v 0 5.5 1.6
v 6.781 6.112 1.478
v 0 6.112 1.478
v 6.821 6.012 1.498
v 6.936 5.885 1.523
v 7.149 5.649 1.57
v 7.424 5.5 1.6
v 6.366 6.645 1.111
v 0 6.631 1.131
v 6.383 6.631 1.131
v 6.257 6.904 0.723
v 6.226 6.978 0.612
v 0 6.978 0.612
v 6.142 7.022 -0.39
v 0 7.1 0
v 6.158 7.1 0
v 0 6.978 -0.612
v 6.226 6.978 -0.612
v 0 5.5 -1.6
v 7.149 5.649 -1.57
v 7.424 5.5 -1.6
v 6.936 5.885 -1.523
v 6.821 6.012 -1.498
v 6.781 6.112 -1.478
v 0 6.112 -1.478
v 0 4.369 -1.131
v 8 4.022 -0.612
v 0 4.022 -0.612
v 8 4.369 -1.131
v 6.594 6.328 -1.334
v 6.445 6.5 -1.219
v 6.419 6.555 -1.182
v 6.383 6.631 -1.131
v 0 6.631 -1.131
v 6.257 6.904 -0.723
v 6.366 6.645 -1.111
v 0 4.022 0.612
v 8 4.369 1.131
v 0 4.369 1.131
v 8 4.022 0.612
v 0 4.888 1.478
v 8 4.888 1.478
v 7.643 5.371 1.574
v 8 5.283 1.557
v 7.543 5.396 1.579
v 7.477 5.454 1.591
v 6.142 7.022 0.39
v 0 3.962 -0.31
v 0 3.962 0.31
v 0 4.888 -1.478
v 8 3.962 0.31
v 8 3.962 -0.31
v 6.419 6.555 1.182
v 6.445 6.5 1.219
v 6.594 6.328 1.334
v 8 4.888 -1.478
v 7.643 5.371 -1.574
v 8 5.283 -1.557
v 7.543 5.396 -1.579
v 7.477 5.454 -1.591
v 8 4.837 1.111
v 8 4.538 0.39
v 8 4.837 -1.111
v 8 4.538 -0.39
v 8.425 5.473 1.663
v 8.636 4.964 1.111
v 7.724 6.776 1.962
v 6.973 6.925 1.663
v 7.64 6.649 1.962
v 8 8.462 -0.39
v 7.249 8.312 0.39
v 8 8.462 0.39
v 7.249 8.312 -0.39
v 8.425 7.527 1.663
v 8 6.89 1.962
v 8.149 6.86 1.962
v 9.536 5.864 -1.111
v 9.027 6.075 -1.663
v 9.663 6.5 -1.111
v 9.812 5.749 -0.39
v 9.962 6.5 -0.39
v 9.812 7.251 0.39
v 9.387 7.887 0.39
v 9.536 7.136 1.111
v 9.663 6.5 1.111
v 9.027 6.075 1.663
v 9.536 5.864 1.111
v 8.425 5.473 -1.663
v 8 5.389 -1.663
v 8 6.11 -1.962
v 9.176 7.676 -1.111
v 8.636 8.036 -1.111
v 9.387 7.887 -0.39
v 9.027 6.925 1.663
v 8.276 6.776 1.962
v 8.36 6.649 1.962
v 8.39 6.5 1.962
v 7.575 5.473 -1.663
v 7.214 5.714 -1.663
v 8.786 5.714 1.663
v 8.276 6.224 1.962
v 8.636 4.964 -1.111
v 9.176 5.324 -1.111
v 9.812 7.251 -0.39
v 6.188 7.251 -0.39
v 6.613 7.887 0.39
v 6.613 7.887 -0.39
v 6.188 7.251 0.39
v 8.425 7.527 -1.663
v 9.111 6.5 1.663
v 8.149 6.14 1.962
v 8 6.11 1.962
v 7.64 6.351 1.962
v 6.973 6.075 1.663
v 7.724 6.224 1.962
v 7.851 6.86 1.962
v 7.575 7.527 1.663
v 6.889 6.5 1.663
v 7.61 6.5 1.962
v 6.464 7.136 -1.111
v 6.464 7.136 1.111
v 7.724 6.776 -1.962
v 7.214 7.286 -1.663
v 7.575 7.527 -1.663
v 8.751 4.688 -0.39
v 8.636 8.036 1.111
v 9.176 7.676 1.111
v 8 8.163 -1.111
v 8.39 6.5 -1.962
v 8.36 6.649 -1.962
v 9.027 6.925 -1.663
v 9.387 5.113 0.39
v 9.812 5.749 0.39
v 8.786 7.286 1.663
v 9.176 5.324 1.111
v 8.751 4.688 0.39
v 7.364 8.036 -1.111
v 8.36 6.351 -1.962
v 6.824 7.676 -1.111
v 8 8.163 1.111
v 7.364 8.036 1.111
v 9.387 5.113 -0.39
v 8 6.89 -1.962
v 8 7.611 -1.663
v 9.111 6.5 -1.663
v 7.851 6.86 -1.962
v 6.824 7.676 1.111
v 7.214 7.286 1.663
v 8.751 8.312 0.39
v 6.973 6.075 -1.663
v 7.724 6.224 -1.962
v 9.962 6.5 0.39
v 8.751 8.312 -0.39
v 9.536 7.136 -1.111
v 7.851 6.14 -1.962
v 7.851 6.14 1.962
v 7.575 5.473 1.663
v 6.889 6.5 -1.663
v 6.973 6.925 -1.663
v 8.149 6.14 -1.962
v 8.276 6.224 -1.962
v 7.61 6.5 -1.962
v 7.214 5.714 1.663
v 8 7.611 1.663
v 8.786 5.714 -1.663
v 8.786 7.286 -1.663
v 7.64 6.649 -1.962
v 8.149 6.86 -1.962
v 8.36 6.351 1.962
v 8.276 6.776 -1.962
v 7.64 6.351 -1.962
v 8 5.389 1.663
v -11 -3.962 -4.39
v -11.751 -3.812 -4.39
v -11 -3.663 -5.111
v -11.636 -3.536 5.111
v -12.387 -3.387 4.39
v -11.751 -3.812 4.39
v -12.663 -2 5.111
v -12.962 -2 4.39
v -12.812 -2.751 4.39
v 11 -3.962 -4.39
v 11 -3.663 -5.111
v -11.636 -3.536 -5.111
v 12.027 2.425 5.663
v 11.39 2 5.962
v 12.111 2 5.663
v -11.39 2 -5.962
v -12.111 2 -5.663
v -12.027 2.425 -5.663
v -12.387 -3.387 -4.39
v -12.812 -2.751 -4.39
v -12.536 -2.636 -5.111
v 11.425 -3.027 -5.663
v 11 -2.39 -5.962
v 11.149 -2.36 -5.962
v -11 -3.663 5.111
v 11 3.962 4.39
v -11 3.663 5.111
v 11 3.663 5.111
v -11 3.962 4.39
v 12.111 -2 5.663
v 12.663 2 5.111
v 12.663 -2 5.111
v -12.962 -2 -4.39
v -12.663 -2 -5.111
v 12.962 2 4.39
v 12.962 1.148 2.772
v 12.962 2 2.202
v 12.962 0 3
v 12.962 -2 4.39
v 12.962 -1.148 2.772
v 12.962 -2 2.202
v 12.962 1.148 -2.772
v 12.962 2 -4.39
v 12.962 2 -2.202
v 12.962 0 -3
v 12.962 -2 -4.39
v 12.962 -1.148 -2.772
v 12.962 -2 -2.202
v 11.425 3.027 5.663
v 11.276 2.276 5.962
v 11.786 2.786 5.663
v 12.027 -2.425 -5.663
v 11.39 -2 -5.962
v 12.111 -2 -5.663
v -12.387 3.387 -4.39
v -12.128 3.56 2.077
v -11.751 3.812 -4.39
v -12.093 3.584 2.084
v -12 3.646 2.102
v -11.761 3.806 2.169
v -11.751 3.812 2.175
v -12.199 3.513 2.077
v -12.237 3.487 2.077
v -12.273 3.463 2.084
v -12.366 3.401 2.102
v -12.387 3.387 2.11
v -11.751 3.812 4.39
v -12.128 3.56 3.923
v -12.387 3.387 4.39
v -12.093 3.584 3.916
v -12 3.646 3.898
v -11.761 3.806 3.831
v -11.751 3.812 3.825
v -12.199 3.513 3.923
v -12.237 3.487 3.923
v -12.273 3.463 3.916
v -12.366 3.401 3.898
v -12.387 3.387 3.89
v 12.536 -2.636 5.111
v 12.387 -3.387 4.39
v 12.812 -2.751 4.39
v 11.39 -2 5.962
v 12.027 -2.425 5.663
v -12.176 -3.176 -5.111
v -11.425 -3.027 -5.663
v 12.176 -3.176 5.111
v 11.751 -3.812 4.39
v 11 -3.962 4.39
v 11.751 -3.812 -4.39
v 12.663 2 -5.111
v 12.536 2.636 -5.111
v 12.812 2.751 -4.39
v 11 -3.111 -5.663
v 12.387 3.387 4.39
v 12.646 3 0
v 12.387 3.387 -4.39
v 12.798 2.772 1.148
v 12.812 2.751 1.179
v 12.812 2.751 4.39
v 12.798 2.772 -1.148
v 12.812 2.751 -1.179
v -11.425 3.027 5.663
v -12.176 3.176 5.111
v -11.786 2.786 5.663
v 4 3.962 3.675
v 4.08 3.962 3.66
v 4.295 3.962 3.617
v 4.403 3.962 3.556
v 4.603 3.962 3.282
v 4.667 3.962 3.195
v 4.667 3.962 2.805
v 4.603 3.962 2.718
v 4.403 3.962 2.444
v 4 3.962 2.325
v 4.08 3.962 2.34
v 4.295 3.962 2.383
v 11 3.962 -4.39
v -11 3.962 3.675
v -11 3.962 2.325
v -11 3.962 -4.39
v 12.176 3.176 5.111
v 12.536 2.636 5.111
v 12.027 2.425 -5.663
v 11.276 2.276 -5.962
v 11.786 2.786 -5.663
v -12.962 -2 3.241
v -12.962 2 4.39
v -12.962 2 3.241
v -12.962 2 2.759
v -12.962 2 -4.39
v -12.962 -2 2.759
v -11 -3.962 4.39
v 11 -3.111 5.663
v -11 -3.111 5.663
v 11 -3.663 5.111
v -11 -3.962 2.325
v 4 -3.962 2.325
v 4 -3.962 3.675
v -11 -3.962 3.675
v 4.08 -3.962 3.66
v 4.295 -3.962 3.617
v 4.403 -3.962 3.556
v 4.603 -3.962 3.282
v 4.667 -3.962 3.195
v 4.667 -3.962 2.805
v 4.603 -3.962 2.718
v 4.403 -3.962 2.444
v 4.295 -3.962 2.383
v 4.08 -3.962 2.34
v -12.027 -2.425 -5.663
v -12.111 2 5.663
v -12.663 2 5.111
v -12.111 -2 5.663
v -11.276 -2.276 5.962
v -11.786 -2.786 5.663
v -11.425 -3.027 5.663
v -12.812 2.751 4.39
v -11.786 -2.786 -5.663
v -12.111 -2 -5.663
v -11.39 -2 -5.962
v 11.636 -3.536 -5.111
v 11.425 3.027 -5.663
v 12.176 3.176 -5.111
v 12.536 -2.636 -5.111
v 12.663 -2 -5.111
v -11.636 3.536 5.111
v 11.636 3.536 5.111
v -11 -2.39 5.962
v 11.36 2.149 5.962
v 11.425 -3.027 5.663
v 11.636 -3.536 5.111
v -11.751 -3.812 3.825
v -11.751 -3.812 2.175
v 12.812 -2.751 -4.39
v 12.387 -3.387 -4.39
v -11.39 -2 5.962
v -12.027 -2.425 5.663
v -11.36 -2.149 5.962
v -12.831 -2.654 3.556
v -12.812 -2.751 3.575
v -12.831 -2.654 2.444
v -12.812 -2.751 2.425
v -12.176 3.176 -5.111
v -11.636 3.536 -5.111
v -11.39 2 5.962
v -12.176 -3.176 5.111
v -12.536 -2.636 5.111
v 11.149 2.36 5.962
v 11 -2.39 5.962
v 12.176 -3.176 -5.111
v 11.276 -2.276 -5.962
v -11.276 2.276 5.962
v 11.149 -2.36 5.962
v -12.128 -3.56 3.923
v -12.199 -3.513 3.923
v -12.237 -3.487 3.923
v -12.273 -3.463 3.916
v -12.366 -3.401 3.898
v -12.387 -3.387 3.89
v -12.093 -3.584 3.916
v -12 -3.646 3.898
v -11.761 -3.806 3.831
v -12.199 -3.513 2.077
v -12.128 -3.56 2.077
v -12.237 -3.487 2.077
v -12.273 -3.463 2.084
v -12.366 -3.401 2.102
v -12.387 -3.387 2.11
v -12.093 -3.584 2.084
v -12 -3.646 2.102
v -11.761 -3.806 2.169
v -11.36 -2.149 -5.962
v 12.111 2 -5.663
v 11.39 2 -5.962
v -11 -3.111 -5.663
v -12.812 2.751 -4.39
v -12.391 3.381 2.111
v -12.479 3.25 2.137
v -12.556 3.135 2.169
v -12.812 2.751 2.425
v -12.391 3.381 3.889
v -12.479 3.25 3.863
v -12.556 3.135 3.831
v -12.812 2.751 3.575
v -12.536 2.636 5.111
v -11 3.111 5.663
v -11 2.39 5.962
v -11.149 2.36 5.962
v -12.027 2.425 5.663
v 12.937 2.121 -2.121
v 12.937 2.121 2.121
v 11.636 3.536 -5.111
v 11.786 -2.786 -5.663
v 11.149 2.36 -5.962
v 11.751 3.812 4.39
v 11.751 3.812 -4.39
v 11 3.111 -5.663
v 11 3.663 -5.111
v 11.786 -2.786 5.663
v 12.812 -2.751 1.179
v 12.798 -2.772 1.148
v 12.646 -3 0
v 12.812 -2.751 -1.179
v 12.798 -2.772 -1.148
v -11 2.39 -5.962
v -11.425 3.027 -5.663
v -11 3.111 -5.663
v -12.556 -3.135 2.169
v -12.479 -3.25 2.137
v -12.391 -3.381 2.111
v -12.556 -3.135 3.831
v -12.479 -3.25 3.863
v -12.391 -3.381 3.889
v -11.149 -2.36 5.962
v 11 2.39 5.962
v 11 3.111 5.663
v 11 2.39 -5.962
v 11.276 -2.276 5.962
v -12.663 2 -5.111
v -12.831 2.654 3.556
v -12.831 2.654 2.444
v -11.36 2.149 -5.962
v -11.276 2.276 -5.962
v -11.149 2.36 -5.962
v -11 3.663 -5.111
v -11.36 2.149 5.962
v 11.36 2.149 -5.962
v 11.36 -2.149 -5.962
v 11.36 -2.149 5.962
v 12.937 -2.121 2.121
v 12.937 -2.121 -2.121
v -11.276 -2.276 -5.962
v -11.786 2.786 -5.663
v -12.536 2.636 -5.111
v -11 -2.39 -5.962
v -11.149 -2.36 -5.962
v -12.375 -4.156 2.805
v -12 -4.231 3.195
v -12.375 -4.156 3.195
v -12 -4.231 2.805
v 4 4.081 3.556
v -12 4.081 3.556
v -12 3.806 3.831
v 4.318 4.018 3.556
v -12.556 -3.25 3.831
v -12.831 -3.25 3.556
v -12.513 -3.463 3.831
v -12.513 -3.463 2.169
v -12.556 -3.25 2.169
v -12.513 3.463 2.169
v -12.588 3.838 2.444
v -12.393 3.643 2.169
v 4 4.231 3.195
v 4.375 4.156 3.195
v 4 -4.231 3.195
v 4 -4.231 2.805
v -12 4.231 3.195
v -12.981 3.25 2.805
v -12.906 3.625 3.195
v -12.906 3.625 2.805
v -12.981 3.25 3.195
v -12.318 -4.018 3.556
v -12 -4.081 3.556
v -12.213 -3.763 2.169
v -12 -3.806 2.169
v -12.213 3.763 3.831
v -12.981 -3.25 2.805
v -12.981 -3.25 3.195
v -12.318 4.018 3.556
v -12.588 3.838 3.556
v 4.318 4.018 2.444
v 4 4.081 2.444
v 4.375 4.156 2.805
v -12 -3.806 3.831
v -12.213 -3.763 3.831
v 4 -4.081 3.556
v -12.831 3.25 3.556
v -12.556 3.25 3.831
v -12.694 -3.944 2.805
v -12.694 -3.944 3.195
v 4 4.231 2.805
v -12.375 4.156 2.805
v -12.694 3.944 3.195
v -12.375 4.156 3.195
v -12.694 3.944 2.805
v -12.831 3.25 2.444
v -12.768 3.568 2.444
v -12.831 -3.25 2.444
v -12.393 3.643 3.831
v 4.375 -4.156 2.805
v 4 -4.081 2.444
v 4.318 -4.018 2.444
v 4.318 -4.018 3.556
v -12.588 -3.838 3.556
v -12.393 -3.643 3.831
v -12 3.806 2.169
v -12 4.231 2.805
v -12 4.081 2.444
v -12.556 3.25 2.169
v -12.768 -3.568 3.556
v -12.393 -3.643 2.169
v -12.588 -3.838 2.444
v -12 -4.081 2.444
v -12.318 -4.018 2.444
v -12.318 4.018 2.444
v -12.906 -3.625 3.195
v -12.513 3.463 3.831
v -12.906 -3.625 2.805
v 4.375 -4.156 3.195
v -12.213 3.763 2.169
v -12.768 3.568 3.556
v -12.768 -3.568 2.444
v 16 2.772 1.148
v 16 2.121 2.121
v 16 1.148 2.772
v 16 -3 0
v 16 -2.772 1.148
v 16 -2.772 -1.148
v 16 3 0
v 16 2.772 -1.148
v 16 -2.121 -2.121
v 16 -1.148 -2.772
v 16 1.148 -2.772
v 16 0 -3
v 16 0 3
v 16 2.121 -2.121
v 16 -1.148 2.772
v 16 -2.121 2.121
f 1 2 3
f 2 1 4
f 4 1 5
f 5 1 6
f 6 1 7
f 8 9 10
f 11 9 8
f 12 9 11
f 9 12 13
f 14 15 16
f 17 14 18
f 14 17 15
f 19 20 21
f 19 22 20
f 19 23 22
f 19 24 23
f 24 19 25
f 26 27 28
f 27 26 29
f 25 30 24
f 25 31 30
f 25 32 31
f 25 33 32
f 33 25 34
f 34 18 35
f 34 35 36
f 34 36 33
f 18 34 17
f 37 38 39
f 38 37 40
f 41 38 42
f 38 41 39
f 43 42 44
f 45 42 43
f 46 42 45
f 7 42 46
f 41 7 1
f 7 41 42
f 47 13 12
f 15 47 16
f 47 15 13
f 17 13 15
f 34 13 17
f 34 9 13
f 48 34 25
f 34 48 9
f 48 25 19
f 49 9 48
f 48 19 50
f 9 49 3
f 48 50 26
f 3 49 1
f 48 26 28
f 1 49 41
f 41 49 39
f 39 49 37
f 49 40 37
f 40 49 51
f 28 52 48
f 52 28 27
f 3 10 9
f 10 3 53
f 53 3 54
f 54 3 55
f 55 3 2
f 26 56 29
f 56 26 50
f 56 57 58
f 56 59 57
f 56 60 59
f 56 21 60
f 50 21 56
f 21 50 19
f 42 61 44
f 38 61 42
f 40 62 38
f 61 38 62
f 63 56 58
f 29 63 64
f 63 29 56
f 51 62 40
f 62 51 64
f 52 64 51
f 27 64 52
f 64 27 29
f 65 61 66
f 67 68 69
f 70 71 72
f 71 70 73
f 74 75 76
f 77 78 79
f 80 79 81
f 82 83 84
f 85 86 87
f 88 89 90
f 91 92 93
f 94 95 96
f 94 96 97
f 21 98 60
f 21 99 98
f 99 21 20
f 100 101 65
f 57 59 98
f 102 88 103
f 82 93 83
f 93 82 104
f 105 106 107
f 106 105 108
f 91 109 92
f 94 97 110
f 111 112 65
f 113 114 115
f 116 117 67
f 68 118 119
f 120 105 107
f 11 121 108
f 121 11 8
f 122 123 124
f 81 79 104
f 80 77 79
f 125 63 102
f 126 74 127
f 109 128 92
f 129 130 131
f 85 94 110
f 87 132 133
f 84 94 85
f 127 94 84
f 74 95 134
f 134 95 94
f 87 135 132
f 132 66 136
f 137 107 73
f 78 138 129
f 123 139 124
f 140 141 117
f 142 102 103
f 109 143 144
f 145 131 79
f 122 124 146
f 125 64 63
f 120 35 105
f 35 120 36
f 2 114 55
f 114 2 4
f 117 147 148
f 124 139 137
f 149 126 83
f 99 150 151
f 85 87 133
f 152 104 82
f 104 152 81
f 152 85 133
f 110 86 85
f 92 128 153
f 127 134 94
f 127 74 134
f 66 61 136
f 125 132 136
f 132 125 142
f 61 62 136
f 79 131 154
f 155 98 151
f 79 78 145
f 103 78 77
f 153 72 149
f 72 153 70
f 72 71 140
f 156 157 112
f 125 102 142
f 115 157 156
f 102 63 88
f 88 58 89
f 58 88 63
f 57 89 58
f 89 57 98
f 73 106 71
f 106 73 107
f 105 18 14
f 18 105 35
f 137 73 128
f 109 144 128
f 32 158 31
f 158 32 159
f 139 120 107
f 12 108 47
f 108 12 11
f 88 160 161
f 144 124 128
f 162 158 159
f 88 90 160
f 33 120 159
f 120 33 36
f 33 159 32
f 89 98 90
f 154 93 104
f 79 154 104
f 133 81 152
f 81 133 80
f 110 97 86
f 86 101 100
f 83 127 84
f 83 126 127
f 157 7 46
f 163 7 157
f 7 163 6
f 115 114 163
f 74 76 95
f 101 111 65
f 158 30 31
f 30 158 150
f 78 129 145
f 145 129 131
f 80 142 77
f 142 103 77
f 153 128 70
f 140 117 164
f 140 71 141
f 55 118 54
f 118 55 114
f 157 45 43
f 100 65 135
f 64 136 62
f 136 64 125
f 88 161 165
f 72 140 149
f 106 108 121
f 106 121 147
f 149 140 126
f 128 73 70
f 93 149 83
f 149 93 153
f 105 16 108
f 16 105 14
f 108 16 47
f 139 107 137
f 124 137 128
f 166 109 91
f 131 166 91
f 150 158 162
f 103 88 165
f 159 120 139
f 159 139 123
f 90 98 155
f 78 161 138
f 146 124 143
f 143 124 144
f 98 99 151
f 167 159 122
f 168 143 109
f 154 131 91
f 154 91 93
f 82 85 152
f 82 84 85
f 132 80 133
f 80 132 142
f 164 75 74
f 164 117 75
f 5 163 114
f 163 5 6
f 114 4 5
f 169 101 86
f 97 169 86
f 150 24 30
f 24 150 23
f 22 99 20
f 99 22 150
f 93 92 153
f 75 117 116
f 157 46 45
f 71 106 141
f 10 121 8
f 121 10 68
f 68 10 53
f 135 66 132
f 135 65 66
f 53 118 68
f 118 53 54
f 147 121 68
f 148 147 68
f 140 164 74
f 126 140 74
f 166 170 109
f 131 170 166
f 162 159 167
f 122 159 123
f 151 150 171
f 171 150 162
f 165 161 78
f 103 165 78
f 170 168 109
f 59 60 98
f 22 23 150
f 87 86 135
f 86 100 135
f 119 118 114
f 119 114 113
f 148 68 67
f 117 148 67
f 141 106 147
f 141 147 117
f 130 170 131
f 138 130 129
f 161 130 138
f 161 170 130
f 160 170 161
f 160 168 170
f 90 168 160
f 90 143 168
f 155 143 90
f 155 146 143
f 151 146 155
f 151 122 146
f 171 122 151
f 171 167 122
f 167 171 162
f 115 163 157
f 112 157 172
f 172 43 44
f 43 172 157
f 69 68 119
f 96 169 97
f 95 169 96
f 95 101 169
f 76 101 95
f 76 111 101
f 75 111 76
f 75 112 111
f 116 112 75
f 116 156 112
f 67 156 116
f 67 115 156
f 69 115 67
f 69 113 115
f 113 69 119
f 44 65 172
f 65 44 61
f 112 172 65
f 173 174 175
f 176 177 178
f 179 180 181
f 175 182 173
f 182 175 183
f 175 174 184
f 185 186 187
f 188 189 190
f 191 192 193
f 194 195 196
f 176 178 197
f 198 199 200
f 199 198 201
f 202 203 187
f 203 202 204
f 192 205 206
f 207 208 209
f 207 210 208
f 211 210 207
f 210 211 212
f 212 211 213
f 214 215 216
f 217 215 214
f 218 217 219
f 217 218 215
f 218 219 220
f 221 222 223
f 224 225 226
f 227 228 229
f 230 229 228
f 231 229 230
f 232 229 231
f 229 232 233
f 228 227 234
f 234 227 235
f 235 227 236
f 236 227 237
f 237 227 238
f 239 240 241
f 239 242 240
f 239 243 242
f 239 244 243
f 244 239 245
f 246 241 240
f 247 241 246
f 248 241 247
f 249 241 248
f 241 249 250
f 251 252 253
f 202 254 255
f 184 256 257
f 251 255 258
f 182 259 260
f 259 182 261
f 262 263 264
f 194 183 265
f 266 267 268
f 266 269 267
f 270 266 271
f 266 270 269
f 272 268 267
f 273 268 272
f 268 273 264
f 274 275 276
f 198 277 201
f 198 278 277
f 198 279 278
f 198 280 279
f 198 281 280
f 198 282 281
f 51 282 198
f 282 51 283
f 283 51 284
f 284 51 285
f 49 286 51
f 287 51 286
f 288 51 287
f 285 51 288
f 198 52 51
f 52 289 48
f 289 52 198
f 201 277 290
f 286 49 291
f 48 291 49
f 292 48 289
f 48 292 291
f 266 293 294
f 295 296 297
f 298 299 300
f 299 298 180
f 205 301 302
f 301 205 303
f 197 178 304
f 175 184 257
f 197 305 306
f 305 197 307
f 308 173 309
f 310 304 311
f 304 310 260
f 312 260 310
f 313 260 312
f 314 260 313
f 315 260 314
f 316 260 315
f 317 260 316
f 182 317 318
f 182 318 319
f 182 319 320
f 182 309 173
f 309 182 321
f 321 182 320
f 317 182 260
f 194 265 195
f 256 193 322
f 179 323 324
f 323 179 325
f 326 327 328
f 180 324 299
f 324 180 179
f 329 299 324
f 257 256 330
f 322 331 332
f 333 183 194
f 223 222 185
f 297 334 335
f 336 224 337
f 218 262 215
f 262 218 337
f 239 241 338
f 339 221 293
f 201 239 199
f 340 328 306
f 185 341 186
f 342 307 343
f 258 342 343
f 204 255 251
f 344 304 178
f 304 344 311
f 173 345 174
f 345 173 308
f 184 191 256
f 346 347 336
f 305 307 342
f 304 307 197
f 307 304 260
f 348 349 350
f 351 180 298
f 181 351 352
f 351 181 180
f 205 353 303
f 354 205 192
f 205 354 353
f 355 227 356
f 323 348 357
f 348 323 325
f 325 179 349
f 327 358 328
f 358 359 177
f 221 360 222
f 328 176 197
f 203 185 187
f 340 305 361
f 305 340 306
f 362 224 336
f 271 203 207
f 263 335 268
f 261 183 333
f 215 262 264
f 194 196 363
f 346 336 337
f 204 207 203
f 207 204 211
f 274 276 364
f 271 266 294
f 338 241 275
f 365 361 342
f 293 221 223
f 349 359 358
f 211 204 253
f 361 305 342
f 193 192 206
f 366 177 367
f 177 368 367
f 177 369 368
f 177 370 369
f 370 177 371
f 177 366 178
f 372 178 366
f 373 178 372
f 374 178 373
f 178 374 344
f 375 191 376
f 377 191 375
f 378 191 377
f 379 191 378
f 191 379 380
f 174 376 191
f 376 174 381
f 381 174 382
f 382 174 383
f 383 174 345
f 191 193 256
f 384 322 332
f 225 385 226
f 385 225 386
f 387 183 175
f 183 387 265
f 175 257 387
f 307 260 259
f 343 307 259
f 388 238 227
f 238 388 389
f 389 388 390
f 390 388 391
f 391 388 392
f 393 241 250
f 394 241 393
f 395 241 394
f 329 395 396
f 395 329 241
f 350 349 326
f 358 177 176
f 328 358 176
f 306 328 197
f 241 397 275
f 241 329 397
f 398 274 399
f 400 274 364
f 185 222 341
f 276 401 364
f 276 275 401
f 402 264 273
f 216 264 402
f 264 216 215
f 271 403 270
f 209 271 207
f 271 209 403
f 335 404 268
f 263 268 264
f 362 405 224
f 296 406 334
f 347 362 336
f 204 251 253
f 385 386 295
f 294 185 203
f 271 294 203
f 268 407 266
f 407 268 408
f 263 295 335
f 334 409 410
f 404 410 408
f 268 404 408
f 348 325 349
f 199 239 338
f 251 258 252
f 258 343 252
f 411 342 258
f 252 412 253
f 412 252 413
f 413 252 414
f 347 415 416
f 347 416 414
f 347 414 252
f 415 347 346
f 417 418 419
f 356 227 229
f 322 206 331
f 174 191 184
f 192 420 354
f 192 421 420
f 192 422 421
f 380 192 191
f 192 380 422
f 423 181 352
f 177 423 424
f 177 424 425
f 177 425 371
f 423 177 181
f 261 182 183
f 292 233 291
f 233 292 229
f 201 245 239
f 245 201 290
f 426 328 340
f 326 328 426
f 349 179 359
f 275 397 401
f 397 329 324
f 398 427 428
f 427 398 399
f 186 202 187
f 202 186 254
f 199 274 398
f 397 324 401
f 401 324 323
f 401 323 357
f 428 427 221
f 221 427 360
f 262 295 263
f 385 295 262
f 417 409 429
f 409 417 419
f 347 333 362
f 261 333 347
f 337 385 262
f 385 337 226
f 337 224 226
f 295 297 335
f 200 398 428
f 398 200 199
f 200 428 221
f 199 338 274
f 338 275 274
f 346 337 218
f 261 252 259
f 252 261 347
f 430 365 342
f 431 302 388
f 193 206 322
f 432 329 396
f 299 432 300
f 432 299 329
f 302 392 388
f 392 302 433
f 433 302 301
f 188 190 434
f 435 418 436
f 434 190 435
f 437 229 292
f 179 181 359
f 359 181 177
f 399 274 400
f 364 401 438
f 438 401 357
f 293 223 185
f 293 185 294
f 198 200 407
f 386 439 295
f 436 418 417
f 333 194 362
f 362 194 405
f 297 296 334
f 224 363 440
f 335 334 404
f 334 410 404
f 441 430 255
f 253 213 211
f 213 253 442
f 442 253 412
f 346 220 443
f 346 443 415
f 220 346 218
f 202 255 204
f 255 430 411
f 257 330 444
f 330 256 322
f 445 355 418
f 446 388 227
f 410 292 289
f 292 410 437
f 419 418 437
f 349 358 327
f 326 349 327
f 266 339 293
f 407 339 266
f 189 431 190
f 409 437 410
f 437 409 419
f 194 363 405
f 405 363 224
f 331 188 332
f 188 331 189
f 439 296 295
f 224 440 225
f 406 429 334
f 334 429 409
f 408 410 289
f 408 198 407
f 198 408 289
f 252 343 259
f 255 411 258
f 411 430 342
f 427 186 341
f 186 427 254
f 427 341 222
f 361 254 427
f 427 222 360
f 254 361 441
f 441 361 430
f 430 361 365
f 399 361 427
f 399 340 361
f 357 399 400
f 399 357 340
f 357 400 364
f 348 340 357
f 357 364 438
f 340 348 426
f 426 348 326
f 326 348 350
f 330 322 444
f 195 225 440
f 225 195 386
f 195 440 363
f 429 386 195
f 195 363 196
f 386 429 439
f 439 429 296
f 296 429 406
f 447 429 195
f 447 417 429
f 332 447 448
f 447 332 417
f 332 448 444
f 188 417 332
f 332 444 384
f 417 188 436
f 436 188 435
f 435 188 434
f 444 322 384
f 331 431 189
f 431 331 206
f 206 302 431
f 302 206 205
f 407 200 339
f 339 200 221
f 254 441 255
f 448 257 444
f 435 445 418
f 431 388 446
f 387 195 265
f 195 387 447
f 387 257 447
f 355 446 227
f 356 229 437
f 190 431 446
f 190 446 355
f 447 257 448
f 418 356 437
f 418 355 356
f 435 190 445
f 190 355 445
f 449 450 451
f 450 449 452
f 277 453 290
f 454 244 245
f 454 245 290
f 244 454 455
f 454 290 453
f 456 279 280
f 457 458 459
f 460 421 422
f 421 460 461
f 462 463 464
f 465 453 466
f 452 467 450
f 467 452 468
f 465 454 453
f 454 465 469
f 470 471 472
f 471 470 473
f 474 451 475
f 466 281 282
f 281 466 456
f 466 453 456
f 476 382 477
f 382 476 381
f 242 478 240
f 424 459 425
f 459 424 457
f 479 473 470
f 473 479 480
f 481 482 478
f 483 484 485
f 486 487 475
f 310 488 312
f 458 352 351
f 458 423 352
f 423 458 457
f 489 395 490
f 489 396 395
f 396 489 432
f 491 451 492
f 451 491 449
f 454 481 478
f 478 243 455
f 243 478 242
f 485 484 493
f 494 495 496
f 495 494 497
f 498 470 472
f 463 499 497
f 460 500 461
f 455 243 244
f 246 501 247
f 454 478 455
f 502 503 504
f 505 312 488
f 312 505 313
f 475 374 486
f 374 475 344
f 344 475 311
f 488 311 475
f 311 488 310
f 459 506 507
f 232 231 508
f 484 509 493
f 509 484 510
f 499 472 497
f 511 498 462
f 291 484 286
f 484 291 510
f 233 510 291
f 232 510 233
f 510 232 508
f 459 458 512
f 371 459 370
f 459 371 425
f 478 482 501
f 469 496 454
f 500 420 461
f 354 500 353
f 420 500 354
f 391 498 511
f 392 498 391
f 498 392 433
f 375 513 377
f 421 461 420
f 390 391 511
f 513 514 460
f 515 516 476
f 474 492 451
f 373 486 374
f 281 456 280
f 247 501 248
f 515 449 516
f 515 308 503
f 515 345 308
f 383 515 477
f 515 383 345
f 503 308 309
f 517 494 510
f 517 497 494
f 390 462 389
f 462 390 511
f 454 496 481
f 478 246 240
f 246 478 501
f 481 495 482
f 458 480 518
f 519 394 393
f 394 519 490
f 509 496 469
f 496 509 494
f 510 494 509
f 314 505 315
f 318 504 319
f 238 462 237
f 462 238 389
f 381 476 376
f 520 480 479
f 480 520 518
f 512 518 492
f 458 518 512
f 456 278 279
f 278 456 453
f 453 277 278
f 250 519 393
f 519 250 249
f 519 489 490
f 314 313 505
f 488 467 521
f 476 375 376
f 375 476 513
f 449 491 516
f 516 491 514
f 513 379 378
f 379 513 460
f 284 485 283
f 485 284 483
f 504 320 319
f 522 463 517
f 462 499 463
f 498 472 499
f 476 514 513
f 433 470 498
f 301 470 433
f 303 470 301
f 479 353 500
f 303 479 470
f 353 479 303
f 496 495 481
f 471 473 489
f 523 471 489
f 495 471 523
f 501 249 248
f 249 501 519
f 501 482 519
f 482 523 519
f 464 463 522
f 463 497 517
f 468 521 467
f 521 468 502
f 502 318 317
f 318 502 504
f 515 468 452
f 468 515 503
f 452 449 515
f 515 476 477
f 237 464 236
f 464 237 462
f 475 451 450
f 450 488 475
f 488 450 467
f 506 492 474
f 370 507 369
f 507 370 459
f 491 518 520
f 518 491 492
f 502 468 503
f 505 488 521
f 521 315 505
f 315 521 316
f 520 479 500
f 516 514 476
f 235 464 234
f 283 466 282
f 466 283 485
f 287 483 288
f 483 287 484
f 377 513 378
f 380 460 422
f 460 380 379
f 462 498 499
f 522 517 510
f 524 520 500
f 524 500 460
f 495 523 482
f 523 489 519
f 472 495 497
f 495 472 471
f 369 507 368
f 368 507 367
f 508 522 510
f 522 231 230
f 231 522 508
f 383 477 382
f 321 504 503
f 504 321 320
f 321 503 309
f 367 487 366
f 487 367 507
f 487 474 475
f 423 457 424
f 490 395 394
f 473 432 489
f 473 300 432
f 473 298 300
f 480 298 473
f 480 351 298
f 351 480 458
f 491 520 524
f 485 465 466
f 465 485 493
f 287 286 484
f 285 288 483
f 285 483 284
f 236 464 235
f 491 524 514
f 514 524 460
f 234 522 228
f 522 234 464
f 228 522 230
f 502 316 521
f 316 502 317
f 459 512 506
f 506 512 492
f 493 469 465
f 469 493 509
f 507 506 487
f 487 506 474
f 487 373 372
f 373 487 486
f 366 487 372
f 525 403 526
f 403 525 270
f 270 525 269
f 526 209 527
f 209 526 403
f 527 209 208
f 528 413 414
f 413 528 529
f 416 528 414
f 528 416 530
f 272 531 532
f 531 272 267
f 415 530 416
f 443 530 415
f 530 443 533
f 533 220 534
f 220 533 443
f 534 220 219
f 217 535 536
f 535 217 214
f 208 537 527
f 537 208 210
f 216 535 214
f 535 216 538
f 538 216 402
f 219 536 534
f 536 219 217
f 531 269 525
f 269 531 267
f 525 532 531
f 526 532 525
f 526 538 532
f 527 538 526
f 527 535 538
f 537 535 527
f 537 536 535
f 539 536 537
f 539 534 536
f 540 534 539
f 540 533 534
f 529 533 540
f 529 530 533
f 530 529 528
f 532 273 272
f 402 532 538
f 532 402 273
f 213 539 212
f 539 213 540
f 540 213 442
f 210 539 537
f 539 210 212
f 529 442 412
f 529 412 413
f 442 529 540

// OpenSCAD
// 步枪枪机框 bolt carrier（独立枪栓）— 精细版 v2
// 默认位于机匣内，沿 -X 拖动即后坐（拉枪机）
$fn = 16;

module rbox(x,y,z,r=1.2){
  hull(){
    translate([-x/2+r,-y/2+r,-z/2+r]) sphere(r);
    translate([ x/2-r,-y/2+r,-z/2+r]) sphere(r);
    translate([-x/2+r, y/2-r,-z/2+r]) sphere(r);
    translate([ x/2-r, y/2-r,-z/2+r]) sphere(r);
    translate([-x/2+r,-y/2+r, z/2-r]) sphere(r);
    translate([ x/2-r,-y/2+r, z/2-r]) sphere(r);
    translate([-x/2+r, y/2-r, z/2-r]) sphere(r);
    translate([ x/2-r, y/2-r, z/2-r]) sphere(r);
  }
}

COL       = "#565c66";
COL_DARK  = "#16191d";
COL_STEEL = "#7a8089";

// 枪机框主体
color(COL) rbox(26,8,12,2);

// 拉机柄 charging handle（侧向伸出）
color(COL_DARK){
  translate([4, 5.5, 0]) rotate([0,90,0]) cylinder(h=8,r=1.6,center=true);
  translate([8, 6.5, 0]) sphere(2);
}
// 表面导槽
color(COL_DARK) translate([-4,0,3]) rbox(18,8.5,2,1);

// 前端枪机头
color(COL_STEEL) translate([14,0,0]) rotate([0,90,0]) cylinder(h=4,r=3,center=true);
